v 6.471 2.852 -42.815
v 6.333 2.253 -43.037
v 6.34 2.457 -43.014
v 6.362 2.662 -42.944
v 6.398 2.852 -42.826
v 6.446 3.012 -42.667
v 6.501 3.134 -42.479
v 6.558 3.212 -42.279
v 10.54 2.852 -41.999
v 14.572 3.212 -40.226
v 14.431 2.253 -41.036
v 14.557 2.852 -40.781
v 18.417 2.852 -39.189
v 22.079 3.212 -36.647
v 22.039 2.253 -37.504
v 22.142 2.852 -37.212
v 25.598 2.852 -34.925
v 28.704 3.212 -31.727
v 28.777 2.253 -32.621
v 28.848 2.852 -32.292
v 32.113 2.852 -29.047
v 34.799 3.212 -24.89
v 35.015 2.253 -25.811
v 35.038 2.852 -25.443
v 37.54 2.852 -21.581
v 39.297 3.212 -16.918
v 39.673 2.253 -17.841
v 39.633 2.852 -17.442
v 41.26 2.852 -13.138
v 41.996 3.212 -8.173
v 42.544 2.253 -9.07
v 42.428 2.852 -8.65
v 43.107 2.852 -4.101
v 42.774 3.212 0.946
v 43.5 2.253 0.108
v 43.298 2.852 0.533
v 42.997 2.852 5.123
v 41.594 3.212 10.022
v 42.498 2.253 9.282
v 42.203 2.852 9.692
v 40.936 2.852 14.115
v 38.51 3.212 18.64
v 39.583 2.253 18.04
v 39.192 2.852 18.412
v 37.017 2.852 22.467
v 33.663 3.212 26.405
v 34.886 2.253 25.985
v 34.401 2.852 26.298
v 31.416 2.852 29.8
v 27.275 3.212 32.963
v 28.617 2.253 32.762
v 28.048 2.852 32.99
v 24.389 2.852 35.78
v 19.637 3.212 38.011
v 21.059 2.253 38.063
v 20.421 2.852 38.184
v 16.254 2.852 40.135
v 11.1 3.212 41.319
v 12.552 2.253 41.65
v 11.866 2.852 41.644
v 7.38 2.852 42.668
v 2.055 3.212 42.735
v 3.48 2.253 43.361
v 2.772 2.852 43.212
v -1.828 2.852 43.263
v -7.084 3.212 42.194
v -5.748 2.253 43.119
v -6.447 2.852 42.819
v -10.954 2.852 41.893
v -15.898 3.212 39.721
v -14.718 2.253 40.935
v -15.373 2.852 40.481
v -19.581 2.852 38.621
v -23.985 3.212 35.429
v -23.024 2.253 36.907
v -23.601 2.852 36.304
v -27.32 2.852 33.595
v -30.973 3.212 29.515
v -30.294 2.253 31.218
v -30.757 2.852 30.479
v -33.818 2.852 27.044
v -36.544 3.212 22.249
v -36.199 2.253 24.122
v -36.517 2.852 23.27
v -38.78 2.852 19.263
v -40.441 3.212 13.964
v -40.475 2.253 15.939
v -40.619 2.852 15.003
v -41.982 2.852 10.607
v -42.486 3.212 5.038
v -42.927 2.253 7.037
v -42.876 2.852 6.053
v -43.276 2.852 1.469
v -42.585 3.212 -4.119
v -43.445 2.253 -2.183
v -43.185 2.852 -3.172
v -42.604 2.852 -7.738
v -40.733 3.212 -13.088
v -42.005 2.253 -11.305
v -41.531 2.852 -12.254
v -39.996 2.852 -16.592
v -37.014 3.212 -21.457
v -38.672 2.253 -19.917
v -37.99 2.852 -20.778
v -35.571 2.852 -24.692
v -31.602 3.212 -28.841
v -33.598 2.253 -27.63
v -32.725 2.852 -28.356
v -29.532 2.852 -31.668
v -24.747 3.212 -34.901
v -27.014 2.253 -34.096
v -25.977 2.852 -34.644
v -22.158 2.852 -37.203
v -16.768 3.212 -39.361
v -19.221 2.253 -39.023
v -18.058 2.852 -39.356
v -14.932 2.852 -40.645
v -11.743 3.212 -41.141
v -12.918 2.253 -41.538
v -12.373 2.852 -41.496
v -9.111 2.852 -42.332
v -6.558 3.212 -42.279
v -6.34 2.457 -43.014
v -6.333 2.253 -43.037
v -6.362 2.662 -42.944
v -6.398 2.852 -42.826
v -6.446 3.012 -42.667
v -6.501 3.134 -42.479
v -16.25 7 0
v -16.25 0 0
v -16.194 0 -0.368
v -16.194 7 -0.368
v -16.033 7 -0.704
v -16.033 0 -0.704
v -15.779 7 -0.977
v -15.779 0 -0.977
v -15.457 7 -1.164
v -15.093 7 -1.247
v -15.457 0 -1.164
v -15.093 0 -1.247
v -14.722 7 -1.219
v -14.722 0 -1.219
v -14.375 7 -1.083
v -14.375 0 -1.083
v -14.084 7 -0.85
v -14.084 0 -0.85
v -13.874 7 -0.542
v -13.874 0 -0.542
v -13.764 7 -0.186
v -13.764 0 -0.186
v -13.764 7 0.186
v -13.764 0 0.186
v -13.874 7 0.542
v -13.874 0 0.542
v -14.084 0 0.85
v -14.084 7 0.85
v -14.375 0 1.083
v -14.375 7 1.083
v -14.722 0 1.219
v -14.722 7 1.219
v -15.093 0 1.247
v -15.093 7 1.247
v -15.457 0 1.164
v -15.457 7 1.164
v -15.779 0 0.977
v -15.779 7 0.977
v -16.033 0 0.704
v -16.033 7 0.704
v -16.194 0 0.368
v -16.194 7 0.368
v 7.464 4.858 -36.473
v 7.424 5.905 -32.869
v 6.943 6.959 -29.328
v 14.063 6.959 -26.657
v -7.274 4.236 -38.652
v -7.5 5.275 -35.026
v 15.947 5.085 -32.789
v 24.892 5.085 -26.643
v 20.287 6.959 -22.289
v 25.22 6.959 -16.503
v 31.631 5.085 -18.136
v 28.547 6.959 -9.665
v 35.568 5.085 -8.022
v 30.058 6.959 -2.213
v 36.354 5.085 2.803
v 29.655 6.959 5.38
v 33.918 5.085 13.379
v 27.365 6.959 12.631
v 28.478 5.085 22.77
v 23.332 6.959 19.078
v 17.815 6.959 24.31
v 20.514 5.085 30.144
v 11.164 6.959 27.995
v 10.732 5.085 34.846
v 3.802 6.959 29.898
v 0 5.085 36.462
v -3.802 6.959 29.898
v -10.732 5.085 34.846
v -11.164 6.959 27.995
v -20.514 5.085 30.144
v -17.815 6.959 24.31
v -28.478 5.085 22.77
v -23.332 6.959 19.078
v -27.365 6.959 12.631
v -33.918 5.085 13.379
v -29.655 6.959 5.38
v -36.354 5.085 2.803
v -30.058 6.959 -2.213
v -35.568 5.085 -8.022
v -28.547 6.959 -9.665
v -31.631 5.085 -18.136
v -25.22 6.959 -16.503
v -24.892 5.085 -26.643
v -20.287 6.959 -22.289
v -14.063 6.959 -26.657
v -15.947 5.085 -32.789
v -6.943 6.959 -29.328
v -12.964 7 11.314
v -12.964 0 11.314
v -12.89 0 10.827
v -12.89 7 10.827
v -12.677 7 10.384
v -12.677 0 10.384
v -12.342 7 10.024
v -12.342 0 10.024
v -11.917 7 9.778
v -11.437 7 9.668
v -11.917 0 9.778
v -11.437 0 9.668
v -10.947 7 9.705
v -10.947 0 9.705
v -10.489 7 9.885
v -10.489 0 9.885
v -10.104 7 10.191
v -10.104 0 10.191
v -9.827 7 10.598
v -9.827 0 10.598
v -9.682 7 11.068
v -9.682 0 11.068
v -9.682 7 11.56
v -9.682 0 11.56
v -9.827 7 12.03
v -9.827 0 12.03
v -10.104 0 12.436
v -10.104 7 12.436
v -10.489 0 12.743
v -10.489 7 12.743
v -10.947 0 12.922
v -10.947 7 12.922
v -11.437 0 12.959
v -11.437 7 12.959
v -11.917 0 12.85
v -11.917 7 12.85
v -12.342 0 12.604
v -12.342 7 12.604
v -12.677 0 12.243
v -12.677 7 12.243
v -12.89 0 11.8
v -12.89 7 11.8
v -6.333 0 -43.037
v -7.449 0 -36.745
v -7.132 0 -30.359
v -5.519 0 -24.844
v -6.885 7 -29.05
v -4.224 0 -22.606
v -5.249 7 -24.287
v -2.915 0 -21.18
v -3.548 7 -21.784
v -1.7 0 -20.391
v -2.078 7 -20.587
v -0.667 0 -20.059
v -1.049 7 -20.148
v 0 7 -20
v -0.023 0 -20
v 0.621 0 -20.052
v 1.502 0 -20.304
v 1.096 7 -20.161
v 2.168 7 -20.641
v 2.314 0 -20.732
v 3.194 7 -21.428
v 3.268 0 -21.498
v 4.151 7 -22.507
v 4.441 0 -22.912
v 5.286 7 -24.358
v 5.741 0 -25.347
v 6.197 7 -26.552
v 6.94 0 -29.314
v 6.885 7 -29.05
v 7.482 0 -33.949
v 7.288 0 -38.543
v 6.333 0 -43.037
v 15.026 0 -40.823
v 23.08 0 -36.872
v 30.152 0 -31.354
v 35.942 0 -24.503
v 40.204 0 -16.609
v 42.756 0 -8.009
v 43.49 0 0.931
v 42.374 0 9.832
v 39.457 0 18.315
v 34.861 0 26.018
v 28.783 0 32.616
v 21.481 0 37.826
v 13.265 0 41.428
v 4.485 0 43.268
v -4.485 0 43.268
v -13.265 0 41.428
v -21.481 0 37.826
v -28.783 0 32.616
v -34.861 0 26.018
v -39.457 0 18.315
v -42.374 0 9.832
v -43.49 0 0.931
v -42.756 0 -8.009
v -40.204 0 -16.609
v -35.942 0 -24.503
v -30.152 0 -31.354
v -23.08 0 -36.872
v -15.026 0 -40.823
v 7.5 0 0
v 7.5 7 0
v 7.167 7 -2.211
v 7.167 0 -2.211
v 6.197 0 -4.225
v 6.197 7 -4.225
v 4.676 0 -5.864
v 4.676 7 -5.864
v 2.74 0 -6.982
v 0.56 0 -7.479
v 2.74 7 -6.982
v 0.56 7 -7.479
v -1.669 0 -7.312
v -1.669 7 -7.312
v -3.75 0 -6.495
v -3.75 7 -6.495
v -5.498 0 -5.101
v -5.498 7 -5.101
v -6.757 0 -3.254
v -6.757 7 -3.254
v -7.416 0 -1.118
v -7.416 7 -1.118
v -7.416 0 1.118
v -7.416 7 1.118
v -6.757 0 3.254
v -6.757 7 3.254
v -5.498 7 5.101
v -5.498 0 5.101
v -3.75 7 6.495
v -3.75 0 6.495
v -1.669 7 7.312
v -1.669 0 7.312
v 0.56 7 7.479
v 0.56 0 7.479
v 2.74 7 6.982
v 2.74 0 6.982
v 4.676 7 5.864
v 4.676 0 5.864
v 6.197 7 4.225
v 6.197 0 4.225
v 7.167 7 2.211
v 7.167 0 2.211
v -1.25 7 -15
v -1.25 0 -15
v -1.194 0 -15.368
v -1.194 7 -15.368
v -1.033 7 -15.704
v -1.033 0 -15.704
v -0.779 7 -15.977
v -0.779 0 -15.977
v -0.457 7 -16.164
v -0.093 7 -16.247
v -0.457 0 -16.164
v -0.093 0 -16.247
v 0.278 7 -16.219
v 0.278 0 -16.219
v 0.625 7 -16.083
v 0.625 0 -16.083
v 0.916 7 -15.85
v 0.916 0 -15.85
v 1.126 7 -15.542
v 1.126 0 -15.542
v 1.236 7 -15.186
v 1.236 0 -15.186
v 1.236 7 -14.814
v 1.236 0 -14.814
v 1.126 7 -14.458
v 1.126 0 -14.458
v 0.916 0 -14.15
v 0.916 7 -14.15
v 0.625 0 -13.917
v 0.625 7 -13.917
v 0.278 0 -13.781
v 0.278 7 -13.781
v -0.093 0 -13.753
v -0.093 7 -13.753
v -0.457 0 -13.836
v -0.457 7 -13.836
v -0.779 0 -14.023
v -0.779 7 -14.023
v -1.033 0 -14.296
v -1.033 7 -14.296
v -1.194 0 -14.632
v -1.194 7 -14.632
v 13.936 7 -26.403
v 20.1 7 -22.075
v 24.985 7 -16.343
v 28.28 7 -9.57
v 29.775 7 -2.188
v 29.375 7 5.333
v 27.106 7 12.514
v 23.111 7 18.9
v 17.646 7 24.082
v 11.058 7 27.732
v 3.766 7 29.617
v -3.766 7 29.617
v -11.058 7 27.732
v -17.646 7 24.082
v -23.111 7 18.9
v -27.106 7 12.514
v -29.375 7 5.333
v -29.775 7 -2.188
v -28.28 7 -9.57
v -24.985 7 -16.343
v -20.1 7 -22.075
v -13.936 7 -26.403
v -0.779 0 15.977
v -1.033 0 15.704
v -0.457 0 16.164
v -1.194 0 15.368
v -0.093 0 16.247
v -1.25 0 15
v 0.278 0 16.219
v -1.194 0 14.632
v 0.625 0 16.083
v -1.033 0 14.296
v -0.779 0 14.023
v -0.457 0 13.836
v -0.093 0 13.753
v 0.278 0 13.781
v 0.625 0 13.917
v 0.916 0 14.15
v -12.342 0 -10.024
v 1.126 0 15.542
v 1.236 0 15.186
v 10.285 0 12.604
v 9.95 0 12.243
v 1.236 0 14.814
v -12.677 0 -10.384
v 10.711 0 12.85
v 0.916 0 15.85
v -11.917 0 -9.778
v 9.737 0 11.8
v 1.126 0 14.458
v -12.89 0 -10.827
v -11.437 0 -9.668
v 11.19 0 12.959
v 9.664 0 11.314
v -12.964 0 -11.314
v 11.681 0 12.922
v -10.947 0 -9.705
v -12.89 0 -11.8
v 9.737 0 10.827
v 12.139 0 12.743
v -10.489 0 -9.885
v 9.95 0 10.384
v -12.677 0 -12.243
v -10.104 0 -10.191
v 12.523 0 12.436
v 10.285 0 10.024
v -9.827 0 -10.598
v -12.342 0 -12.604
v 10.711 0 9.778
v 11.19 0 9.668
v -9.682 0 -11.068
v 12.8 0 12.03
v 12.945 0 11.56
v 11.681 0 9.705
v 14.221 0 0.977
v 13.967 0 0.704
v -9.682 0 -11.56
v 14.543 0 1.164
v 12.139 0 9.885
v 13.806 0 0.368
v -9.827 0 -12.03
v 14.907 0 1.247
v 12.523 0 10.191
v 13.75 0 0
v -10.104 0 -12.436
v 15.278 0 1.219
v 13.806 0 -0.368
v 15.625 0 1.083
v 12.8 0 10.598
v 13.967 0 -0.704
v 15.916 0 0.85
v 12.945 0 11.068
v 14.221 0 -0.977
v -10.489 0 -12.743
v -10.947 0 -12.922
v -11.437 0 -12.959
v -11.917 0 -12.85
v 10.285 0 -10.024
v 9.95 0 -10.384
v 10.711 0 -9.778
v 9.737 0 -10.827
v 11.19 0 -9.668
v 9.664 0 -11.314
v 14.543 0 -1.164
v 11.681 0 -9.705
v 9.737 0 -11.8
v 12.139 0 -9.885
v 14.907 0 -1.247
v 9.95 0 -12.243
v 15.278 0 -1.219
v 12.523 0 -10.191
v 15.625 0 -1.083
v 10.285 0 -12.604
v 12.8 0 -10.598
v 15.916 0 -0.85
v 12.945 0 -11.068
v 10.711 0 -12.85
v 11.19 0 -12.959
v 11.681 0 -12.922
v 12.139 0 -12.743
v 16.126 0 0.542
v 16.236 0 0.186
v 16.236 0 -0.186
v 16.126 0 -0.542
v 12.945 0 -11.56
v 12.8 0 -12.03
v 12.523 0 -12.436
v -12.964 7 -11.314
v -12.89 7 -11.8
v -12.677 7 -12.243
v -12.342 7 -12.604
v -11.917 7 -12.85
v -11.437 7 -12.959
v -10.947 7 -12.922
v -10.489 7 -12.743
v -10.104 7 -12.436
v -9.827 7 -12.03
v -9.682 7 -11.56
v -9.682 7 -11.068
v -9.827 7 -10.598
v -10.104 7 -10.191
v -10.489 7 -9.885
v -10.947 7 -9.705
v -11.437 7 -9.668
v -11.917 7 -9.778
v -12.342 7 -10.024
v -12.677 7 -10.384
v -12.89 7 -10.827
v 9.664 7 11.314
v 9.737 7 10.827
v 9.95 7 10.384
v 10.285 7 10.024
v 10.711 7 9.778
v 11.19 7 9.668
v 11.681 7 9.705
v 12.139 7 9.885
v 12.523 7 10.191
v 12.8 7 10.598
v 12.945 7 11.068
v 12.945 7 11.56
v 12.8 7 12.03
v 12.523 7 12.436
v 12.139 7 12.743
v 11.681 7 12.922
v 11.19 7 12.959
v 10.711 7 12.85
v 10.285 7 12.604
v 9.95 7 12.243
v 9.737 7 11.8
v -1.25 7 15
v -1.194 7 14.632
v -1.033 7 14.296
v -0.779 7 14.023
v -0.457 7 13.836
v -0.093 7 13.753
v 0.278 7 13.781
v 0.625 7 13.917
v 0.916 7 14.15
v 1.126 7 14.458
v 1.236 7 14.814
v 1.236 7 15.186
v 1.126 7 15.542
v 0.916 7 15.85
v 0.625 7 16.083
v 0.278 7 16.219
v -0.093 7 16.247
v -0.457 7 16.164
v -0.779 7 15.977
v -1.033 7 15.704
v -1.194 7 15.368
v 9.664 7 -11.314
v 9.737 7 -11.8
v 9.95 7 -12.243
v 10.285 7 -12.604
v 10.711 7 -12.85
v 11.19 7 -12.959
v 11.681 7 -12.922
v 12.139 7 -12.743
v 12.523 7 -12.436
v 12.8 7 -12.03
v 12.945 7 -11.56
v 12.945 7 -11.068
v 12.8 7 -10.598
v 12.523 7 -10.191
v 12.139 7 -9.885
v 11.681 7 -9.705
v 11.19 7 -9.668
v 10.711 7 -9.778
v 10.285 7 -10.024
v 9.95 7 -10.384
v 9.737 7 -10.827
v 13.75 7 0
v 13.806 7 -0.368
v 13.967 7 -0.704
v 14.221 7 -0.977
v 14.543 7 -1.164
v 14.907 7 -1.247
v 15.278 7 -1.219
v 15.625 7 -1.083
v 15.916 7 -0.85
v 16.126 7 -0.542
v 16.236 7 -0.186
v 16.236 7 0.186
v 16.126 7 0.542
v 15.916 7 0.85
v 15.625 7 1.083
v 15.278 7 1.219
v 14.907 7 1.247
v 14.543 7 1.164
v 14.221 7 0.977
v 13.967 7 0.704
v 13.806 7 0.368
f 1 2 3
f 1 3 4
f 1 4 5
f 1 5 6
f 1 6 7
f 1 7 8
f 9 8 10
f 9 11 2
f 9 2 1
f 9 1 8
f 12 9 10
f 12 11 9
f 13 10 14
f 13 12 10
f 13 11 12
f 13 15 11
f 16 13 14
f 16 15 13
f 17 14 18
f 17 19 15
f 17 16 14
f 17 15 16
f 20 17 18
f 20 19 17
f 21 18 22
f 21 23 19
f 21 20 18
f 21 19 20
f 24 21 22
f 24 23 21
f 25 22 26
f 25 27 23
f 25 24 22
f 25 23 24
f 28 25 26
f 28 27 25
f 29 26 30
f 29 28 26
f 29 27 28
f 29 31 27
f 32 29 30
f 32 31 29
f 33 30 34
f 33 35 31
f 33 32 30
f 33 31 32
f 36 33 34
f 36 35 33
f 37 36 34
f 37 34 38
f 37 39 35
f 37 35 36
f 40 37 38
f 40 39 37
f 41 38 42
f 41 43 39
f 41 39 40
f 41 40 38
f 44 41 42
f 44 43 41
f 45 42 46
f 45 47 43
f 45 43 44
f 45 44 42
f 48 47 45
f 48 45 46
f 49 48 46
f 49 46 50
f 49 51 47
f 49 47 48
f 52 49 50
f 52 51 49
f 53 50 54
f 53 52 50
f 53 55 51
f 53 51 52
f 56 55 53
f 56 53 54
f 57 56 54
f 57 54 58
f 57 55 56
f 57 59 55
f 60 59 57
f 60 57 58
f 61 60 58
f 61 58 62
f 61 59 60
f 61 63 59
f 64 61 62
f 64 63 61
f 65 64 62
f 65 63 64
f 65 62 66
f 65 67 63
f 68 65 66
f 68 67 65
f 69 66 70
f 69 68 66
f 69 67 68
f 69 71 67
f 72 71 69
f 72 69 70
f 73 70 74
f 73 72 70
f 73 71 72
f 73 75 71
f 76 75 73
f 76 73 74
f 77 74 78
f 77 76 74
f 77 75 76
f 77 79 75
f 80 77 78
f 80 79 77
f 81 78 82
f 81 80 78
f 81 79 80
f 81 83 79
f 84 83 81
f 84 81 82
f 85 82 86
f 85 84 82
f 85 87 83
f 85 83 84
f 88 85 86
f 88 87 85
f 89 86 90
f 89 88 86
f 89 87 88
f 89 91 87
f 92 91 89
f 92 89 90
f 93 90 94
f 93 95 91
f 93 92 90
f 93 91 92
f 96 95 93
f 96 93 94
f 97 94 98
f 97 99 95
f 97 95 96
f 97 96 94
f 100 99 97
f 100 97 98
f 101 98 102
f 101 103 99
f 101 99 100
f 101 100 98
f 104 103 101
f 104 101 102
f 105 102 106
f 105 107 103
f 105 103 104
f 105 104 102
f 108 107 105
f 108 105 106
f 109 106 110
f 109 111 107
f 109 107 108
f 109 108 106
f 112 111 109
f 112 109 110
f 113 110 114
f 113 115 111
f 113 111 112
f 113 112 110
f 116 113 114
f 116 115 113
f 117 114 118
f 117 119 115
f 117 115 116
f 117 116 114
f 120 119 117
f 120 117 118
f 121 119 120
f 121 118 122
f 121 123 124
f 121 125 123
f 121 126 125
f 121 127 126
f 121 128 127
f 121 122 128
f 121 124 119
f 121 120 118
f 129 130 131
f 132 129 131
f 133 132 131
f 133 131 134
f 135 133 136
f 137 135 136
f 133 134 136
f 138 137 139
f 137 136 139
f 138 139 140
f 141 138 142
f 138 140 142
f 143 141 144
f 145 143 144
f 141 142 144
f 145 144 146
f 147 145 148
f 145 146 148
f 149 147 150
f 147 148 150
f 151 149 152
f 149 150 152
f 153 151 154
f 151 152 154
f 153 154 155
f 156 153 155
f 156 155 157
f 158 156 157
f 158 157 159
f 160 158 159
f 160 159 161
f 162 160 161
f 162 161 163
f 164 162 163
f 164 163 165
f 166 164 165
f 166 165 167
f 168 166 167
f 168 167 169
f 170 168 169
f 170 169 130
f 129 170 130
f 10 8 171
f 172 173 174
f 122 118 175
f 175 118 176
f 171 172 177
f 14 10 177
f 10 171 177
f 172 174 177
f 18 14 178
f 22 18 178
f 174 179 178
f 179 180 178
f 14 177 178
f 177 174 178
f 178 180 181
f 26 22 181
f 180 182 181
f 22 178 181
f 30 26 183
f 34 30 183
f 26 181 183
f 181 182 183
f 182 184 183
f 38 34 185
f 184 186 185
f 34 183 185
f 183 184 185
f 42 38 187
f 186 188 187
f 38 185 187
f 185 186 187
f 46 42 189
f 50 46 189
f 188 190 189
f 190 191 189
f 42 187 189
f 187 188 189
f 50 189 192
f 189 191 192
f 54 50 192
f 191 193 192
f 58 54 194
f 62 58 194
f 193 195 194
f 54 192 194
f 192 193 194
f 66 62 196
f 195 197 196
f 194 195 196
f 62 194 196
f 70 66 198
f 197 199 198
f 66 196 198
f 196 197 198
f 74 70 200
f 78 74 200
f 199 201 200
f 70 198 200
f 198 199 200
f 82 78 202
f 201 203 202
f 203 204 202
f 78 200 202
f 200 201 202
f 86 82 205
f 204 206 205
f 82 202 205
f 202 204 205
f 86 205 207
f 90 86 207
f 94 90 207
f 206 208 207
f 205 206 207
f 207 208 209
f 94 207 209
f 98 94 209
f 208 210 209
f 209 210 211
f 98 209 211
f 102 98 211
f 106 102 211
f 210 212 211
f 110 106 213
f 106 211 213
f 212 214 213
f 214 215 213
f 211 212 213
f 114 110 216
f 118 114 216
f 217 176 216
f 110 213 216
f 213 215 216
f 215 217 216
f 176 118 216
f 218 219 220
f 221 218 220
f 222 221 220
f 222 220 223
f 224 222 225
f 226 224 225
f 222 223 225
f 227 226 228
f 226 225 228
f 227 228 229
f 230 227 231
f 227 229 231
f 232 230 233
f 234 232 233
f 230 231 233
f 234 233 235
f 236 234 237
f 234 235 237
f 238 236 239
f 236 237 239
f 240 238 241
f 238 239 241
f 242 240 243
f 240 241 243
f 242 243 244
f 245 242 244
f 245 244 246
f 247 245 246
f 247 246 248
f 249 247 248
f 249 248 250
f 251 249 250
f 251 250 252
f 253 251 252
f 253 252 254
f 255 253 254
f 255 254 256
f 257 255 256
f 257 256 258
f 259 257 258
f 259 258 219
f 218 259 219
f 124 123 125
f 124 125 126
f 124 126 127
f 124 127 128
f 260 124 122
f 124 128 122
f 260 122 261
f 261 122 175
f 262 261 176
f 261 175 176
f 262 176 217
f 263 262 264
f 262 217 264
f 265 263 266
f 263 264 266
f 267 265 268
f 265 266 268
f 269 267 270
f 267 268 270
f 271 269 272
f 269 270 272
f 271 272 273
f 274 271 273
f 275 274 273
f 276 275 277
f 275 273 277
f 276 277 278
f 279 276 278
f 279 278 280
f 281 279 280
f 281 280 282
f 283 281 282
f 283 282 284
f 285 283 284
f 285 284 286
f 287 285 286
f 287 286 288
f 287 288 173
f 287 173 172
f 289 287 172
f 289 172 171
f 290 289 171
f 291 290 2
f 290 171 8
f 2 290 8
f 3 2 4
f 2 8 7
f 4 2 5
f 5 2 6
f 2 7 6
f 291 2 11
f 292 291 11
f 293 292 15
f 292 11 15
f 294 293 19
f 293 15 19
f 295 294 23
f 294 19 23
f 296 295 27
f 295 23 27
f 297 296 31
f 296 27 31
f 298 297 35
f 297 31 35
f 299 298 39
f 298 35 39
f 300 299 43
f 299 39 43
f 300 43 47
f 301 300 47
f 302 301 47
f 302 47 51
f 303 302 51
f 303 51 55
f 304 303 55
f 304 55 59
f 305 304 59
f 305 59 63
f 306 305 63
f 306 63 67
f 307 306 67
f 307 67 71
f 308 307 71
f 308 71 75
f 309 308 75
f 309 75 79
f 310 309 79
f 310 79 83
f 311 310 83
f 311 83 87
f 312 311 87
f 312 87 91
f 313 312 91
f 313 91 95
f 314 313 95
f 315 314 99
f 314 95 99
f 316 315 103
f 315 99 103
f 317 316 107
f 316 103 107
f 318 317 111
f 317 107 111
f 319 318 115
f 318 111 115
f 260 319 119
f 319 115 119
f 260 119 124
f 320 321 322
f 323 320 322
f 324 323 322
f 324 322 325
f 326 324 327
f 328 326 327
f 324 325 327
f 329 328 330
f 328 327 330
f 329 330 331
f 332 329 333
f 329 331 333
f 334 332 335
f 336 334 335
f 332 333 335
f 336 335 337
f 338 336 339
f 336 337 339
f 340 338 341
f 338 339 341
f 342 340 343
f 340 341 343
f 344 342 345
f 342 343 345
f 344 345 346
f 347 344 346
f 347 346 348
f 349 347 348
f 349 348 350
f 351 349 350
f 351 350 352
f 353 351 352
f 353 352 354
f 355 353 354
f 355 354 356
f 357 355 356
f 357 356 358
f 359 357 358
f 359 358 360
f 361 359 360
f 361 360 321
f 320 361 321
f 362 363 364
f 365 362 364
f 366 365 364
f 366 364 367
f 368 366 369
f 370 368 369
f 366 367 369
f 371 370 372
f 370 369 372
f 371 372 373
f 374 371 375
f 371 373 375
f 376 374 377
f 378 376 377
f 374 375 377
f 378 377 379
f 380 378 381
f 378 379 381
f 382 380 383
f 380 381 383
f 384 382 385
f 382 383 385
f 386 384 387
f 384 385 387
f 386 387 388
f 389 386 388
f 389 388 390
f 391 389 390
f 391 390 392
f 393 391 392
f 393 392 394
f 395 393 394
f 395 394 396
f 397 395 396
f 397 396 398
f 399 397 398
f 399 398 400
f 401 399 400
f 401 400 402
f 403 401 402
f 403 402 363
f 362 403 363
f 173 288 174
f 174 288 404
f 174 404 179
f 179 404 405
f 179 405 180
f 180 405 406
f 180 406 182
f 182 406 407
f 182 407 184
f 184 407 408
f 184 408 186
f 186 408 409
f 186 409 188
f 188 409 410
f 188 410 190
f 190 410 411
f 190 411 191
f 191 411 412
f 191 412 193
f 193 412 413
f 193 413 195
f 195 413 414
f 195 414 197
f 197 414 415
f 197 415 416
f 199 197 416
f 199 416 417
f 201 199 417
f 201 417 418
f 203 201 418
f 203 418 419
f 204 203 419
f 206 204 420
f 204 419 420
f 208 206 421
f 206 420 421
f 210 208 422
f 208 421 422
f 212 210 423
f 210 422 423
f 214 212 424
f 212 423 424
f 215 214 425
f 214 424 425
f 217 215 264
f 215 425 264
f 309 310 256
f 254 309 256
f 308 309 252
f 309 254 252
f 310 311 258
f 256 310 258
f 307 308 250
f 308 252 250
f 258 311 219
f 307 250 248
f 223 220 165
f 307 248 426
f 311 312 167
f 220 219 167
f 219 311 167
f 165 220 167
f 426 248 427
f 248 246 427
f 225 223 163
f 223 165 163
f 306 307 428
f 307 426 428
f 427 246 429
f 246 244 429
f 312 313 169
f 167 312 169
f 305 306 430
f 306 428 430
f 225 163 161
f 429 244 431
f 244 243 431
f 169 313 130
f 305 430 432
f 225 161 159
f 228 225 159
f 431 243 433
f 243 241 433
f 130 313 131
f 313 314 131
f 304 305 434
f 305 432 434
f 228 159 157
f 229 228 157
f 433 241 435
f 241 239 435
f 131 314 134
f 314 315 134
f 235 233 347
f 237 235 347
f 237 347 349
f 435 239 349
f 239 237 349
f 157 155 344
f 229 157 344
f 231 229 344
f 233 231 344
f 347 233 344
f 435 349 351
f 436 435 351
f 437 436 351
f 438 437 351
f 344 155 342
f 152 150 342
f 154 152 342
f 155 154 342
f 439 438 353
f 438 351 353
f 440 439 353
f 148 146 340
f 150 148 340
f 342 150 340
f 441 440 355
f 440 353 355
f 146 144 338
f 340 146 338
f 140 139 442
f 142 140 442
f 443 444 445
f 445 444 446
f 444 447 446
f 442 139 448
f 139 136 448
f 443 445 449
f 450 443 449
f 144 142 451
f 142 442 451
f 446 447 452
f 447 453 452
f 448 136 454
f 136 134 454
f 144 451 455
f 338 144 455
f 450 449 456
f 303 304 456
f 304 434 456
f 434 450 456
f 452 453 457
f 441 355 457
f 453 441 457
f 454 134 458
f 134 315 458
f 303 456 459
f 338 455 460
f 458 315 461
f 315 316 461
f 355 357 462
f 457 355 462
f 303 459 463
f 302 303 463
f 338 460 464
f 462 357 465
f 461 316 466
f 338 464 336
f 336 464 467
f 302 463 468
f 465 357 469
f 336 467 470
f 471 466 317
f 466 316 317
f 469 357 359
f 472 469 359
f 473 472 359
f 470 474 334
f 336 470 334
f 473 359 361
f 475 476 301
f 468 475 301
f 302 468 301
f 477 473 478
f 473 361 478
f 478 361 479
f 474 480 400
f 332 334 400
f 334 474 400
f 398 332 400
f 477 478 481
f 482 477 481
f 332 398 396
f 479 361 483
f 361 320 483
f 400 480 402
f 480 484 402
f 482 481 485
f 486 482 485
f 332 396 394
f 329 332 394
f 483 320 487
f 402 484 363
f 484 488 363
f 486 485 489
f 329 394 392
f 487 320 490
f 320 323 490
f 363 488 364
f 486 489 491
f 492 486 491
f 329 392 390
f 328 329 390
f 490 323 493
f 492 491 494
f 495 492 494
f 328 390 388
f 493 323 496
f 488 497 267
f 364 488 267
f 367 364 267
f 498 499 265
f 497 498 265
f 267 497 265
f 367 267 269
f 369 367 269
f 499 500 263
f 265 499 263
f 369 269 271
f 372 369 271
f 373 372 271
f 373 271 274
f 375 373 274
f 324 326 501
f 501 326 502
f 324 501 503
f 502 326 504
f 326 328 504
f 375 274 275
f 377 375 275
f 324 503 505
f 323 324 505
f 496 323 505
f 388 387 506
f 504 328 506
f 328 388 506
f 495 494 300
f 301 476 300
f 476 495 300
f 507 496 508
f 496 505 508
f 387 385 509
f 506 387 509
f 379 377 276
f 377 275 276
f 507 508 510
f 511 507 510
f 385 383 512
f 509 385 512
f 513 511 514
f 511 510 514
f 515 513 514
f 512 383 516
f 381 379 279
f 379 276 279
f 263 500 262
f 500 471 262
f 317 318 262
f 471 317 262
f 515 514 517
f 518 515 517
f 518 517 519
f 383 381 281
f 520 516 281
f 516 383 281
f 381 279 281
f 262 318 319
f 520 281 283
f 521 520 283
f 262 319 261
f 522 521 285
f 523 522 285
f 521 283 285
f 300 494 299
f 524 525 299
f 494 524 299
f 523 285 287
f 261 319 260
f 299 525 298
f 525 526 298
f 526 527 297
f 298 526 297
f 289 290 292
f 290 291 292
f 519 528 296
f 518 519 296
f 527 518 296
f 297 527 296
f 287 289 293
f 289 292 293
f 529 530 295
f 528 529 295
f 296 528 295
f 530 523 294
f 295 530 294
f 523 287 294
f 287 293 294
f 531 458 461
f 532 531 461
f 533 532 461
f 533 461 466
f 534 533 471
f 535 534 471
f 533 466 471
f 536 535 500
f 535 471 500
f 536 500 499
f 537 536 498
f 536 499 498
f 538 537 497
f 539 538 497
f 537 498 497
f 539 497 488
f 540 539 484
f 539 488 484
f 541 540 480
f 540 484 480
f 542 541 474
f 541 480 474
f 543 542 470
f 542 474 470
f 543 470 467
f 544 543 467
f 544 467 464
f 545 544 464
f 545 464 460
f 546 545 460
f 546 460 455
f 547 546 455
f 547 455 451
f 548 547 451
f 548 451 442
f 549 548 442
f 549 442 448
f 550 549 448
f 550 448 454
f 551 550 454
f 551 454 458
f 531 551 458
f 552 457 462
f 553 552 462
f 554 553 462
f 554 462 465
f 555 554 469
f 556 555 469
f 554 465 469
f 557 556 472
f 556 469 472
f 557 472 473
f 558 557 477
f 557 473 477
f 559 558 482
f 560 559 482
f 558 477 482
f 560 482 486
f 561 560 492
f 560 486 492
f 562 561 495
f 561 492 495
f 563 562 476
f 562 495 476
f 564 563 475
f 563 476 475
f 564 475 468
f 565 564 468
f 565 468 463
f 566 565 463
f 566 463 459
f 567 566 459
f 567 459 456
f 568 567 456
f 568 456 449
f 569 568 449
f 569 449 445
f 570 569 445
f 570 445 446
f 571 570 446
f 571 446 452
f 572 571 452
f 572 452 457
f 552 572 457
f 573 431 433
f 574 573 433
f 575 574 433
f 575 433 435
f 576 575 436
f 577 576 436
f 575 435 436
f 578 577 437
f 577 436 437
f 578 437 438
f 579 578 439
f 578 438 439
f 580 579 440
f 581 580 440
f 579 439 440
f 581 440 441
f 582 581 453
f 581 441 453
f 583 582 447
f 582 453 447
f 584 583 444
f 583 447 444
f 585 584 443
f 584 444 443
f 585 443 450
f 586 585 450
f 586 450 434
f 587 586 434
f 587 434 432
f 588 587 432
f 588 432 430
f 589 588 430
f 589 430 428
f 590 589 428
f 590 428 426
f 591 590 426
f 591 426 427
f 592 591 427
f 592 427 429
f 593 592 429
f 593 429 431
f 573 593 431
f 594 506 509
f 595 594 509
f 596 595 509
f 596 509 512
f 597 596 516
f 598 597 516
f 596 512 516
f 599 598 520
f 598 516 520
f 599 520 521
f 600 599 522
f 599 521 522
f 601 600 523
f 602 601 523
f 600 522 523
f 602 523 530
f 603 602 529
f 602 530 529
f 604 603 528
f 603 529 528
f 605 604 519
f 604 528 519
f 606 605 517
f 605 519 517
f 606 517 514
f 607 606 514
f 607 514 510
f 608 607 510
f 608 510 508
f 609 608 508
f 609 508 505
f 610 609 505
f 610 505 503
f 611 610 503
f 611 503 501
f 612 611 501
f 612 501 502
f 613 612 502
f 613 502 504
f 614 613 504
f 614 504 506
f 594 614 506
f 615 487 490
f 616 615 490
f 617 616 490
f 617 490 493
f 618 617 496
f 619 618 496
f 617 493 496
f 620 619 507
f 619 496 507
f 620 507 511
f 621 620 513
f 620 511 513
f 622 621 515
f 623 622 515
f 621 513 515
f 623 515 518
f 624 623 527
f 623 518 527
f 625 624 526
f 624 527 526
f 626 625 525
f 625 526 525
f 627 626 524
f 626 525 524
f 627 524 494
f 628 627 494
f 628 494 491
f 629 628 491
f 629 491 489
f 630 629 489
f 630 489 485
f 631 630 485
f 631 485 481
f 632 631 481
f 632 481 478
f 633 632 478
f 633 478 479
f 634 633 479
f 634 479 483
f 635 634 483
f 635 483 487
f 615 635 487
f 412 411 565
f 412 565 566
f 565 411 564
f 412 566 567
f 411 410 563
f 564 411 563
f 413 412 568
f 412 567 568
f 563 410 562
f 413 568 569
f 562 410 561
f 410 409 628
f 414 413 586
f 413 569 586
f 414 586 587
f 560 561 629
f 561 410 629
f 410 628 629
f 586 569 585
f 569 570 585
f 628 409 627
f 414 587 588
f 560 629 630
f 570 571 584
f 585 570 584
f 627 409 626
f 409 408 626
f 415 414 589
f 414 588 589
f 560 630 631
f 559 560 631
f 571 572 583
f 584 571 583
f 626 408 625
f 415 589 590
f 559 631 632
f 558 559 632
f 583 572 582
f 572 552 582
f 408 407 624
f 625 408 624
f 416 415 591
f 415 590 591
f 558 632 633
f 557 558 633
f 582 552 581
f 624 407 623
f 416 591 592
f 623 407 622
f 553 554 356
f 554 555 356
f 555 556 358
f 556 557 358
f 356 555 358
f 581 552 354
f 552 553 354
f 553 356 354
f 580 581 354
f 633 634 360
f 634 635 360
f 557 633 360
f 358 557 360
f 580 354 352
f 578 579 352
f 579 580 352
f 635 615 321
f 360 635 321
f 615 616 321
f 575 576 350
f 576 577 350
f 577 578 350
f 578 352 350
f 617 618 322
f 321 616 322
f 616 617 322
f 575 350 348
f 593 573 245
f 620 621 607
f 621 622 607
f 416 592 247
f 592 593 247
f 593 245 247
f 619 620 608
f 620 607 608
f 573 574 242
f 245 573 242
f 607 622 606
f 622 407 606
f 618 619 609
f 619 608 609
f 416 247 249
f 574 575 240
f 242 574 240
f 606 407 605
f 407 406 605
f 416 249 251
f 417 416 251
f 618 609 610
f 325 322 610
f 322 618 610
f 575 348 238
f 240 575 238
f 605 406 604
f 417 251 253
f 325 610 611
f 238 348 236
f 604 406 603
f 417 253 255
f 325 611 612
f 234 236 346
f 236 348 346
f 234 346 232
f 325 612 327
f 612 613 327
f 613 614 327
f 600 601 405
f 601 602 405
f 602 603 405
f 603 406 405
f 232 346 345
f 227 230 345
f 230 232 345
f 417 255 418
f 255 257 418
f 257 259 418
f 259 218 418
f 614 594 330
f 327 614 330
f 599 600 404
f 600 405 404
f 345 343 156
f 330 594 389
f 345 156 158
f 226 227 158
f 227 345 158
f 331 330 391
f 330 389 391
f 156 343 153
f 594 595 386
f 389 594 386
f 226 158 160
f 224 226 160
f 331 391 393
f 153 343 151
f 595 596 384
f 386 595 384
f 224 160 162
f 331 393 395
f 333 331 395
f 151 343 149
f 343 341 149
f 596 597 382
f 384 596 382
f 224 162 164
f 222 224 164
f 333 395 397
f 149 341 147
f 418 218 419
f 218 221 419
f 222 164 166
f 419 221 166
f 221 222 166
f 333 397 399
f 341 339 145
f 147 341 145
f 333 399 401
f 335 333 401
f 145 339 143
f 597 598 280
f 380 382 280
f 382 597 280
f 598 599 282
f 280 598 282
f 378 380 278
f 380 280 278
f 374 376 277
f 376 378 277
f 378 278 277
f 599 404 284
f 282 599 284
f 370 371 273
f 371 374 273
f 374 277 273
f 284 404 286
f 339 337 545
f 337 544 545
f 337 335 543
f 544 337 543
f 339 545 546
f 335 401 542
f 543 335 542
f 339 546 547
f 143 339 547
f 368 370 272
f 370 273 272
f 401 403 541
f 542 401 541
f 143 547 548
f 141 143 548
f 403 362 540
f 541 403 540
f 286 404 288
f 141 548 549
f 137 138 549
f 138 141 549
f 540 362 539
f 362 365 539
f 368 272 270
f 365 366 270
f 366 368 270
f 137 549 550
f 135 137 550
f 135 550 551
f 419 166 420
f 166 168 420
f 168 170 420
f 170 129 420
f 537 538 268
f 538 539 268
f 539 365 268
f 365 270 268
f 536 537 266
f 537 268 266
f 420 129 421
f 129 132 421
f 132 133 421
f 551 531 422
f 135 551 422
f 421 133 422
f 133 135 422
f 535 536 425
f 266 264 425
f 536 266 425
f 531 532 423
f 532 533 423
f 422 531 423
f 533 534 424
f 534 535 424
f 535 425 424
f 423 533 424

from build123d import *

# Parameters (mm, degrees)
SKETCH_2_R          = 7.5
CUT_EXTRUDE_1_DEPTH = 8
SKETCH_3_RX         = 15
SKETCH_3_RY         = 7.5
CUT_EXTRUDE_2_DEPTH = 8
M3X0_51_D           = 2.5
M4X0_71_D           = 3.3
FILLET_1_R          = 1


with BuildPart() as part:
    # Эскиз1 → Повернуть1 (revolve)
    with BuildSketch(Plane.XY):
        Polygon((0, 0), (-43.5, 0), (-43.5, 3), (-30, 7), (0, 7), align=None)
    revolve(axis=Axis((0, 7, 0), (0, -1, 0)))

    # Эскиз2 → Вырез-Вытянуть1 (cut, through all)
    with BuildSketch(Plane(origin=(0, 7, 0), x_dir=(1, 0, 0), z_dir=(0, 1, 0))):
        Circle(SKETCH_2_R)
    extrude(amount=-CUT_EXTRUDE_1_DEPTH, mode=Mode.SUBTRACT)

    # Эскиз3 → Вырез-Вытянуть2 (cut, through all)
    with BuildSketch(Plane(origin=(0, 7, 0), x_dir=(1, 0, 0), z_dir=(0, 1, 0))):
        with Locations(Location((0, 35), (0, 0, -90))):
            Ellipse(SKETCH_3_RX, SKETCH_3_RY)
    extrude(amount=-CUT_EXTRUDE_2_DEPTH, mode=Mode.SUBTRACT)

    # Отверстие обработанное метчиком M3x0.51 (through all)
    with Locations(Plane(origin=(0, 7, 0), x_dir=(1, 0, 0), z_dir=(0, 1, 0))):
        with Locations((0, 15), (-15, 0), (0, -15), (15, 0)):
            Hole(M3X0_51_D / 2)

    # Отверстие обработанное метчиком M4x0.71 (through all)
    with Locations(Plane(origin=(0, 7, 0), x_dir=(1, 0, 0), z_dir=(0, 1, 0))):
        with Locations((-11.313708499, 11.313708499), (11.313708499, 11.313708499), (11.313708499, -11.313708499), (-11.313708499, -11.313708499)):
            Hole(M4X0_71_D / 2)

    # Скругление1
    fillet_1_edges = [part.edges().sort_by_distance(p)[0] for p in [
        (0, 7, 30),
        (0, 3, 43.5),
    ]]
    fillet(fillet_1_edges, radius=FILLET_1_R)


solid = part.part
